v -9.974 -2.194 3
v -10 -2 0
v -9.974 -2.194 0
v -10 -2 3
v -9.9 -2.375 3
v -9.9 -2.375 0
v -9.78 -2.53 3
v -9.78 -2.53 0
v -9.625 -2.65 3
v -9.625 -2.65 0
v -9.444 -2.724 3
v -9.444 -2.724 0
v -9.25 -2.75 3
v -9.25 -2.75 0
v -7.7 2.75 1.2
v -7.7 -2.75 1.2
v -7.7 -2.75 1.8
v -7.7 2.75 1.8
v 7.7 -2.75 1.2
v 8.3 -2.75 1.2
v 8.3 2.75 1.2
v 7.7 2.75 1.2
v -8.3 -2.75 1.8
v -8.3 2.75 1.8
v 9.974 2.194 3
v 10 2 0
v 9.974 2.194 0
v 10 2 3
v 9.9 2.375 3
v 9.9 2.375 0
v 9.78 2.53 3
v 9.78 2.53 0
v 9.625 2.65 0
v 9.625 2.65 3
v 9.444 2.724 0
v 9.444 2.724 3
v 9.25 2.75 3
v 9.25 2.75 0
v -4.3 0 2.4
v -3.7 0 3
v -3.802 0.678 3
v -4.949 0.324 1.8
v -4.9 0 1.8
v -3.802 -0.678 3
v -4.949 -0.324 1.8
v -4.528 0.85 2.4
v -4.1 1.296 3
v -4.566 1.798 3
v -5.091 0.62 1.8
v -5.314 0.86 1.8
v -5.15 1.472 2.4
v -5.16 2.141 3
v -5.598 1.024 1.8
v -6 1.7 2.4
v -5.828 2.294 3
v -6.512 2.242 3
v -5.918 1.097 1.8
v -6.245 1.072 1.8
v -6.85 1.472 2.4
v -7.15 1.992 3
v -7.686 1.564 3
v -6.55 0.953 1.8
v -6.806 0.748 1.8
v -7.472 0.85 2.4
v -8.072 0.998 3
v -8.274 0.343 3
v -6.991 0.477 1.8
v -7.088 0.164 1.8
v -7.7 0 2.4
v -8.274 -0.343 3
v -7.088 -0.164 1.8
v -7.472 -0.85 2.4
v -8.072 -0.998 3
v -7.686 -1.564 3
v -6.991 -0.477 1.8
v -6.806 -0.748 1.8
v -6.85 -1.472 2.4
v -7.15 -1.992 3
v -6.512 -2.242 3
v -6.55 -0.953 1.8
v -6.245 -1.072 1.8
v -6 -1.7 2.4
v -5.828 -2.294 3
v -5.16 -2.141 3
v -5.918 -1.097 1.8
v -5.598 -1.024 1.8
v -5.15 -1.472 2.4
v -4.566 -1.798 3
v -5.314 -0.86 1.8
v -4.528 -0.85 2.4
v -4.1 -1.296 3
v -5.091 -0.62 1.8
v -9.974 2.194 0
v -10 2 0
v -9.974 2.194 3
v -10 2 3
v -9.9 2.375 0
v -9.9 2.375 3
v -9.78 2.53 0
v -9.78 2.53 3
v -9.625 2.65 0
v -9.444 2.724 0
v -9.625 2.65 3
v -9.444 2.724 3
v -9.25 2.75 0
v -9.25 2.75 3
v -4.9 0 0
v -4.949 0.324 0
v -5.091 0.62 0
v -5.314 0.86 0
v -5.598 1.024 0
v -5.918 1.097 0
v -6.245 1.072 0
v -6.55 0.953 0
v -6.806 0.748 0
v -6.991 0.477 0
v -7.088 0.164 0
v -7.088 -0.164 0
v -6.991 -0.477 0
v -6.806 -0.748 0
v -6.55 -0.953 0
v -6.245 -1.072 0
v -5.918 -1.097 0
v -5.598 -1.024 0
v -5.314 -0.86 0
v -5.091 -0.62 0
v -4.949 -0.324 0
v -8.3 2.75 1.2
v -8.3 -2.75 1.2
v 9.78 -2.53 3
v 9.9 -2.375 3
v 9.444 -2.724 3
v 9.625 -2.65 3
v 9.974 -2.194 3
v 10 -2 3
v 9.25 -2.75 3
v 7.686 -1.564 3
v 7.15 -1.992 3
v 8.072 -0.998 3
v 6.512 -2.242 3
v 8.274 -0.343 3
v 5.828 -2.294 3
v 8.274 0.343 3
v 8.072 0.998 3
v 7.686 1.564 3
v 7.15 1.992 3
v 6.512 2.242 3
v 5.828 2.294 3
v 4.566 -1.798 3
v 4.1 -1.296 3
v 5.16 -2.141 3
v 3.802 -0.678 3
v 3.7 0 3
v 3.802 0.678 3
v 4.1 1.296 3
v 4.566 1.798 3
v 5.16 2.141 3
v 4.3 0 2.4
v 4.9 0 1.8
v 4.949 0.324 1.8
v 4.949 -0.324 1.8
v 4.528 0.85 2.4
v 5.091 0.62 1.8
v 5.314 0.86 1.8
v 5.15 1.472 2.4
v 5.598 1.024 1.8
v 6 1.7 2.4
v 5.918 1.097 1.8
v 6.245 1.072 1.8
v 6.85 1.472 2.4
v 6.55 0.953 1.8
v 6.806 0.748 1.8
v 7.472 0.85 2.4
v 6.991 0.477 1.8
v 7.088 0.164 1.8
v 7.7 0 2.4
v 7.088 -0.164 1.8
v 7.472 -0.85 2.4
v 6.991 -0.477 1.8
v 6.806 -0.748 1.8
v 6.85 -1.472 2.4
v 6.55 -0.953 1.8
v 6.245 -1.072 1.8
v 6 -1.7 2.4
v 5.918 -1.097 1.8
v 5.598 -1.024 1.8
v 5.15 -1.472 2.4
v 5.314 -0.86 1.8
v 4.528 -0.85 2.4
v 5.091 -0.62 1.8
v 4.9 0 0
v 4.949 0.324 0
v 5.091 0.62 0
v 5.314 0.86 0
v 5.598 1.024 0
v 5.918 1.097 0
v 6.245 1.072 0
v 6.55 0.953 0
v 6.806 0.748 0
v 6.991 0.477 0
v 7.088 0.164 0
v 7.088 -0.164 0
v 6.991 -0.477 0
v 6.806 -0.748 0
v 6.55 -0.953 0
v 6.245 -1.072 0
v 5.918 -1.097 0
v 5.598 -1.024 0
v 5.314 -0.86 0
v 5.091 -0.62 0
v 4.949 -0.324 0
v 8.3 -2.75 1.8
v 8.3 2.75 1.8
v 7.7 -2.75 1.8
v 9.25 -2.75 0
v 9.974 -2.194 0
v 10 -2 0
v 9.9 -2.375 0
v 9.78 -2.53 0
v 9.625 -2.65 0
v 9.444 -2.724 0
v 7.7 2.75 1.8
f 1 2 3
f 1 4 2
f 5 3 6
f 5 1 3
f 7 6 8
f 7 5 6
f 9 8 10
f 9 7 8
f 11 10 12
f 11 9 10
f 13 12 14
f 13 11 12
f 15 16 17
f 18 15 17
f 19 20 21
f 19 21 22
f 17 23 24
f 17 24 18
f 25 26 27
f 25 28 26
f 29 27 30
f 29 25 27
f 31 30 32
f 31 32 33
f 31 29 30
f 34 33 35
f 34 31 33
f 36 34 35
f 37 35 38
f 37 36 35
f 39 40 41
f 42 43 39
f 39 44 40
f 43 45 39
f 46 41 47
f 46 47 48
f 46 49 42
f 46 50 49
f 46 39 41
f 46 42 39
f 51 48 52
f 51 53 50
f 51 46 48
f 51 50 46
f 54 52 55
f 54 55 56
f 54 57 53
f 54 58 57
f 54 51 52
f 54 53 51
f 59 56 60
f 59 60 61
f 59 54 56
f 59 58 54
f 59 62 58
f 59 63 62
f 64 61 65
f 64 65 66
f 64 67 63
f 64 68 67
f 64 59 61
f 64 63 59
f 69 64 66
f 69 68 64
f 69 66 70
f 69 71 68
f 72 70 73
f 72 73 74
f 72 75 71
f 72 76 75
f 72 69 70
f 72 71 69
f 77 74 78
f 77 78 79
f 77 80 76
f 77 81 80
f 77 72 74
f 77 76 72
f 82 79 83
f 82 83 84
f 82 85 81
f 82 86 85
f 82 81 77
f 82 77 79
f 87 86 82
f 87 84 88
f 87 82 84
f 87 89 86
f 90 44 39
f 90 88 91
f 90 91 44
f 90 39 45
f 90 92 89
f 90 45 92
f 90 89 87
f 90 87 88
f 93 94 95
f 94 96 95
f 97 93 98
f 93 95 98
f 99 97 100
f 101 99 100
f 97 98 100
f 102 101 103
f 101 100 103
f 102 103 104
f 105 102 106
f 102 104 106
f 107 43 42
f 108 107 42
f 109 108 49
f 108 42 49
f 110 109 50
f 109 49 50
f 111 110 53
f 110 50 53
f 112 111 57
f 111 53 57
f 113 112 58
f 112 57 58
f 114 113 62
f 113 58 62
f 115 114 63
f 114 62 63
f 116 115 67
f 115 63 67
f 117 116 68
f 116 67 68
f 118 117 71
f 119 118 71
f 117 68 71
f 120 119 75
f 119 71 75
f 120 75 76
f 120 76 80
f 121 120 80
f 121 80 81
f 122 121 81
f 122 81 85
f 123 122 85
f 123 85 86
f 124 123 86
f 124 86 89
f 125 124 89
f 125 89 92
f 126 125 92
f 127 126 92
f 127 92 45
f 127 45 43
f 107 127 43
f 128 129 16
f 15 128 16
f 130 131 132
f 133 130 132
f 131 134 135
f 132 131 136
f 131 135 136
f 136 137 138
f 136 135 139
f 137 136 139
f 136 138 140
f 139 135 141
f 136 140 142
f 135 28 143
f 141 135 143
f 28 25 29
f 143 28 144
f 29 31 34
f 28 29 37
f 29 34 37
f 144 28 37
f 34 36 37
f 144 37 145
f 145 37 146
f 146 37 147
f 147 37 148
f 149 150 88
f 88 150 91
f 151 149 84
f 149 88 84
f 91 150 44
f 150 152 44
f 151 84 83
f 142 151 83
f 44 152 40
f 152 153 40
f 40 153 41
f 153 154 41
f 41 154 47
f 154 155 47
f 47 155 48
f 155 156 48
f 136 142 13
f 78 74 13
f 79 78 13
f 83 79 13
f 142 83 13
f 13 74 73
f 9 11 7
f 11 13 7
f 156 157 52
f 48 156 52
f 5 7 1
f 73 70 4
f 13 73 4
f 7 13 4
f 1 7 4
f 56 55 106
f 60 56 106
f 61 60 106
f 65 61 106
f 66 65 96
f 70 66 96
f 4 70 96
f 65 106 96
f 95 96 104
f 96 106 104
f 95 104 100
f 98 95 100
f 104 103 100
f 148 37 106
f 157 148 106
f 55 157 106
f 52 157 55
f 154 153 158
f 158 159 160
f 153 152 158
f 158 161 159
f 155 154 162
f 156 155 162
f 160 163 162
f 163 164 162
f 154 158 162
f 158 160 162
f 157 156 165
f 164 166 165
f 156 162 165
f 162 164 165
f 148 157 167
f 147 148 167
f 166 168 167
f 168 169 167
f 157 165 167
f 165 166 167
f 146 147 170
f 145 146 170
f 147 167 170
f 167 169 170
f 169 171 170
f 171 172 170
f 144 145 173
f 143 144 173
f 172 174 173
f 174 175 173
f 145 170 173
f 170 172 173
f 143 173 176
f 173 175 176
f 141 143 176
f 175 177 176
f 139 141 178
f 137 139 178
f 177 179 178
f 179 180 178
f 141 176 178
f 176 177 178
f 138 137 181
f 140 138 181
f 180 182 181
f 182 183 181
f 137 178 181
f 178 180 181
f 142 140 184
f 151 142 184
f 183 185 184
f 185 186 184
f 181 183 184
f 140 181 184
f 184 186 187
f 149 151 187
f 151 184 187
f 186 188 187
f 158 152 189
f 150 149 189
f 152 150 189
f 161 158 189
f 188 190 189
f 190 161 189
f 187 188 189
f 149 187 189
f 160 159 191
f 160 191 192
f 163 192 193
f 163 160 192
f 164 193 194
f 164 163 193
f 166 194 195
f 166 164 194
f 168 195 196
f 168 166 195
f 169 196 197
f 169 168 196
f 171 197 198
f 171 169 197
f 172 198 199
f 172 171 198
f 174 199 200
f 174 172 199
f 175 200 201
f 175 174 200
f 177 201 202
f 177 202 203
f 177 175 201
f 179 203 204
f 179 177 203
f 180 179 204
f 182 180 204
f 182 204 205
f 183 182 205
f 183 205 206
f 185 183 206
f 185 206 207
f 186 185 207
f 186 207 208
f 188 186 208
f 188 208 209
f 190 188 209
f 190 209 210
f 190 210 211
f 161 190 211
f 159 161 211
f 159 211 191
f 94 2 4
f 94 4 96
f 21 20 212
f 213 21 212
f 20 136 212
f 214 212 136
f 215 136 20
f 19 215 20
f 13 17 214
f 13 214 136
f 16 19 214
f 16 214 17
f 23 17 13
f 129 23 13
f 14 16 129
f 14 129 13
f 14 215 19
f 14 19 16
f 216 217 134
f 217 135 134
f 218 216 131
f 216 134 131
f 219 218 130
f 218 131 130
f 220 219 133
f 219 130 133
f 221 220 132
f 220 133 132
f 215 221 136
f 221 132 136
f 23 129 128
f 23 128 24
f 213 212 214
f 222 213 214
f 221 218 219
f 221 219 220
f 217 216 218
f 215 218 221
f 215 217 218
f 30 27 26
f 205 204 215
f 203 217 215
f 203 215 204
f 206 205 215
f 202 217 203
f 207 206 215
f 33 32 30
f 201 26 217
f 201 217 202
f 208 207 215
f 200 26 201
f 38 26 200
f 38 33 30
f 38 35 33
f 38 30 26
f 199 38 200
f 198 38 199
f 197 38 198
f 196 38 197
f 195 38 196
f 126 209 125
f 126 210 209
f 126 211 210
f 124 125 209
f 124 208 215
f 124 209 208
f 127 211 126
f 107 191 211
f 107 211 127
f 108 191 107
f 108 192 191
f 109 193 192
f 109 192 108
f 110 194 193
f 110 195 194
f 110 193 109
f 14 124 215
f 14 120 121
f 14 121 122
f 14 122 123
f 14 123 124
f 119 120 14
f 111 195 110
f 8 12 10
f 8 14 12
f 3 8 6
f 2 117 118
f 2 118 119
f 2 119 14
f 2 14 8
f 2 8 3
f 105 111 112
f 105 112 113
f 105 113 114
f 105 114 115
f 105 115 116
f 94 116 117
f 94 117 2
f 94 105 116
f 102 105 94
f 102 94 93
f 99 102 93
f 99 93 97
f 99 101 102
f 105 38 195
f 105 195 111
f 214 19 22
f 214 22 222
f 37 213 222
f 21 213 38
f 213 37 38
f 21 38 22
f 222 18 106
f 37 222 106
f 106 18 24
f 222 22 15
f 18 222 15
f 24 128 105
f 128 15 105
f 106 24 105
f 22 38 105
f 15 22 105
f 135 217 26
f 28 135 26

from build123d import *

# Parameters (mm, degrees)
SKETCH_W        = 10
SKETCH_H        = 5.5
PAD_DEPTH       = 3
SKETCH001_R     = 1.1
POCKET_DEPTH    = 3.001
SKETCH002_W     = 0.6
SKETCH002_H     = 0.6
POCKET001_DEPTH = 5.501
FILLET_R        = 0.75
CHAMFER_SIZE    = 1.2


with BuildPart() as part:
    # Sketch → Pad (new body)
    with BuildSketch(Plane.XY):
        with Locations((-5, 0)):
            Rectangle(SKETCH_W, SKETCH_H)
    extrude(amount=PAD_DEPTH)

    # Sketch001 (on Face6 of Pad) → Pocket (cut, through all)
    with BuildSketch(Plane.XY.offset(3)):
        with Locations((-6, 0)):
            Circle(SKETCH001_R)
    extrude(amount=-POCKET_DEPTH, mode=Mode.SUBTRACT)

    # Sketch002 (on Face1 of Pocket) → Pocket001 (cut, through all)
    with BuildSketch(Plane.XZ.offset(2.75)):
        with Locations((-8, 1.5)):
            Rectangle(SKETCH002_W, SKETCH002_H)
    extrude(amount=-POCKET001_DEPTH, mode=Mode.SUBTRACT)

    # Fillet
    fillet_edges = [part.edges().sort_by_distance(p)[0] for p in [
        (-10, -2.75, 1.5),
        (-10, 2.75, 1.5),
    ]]
    fillet(fillet_edges, radius=FILLET_R)

    # Mirrored: part across YZ


with BuildPart() as part_1:
    add(part.part)
    add(part.part.mirror(Plane.YZ))

    # Chamfer
    chamfer_edges = [part_1.edges().sort_by_distance(p)[0] for p in [
        (-7.1, 0, 3),
        (7.1, 0, 3),
    ]]
    chamfer(chamfer_edges, length=CHAMFER_SIZE)


solid = part_1.part
